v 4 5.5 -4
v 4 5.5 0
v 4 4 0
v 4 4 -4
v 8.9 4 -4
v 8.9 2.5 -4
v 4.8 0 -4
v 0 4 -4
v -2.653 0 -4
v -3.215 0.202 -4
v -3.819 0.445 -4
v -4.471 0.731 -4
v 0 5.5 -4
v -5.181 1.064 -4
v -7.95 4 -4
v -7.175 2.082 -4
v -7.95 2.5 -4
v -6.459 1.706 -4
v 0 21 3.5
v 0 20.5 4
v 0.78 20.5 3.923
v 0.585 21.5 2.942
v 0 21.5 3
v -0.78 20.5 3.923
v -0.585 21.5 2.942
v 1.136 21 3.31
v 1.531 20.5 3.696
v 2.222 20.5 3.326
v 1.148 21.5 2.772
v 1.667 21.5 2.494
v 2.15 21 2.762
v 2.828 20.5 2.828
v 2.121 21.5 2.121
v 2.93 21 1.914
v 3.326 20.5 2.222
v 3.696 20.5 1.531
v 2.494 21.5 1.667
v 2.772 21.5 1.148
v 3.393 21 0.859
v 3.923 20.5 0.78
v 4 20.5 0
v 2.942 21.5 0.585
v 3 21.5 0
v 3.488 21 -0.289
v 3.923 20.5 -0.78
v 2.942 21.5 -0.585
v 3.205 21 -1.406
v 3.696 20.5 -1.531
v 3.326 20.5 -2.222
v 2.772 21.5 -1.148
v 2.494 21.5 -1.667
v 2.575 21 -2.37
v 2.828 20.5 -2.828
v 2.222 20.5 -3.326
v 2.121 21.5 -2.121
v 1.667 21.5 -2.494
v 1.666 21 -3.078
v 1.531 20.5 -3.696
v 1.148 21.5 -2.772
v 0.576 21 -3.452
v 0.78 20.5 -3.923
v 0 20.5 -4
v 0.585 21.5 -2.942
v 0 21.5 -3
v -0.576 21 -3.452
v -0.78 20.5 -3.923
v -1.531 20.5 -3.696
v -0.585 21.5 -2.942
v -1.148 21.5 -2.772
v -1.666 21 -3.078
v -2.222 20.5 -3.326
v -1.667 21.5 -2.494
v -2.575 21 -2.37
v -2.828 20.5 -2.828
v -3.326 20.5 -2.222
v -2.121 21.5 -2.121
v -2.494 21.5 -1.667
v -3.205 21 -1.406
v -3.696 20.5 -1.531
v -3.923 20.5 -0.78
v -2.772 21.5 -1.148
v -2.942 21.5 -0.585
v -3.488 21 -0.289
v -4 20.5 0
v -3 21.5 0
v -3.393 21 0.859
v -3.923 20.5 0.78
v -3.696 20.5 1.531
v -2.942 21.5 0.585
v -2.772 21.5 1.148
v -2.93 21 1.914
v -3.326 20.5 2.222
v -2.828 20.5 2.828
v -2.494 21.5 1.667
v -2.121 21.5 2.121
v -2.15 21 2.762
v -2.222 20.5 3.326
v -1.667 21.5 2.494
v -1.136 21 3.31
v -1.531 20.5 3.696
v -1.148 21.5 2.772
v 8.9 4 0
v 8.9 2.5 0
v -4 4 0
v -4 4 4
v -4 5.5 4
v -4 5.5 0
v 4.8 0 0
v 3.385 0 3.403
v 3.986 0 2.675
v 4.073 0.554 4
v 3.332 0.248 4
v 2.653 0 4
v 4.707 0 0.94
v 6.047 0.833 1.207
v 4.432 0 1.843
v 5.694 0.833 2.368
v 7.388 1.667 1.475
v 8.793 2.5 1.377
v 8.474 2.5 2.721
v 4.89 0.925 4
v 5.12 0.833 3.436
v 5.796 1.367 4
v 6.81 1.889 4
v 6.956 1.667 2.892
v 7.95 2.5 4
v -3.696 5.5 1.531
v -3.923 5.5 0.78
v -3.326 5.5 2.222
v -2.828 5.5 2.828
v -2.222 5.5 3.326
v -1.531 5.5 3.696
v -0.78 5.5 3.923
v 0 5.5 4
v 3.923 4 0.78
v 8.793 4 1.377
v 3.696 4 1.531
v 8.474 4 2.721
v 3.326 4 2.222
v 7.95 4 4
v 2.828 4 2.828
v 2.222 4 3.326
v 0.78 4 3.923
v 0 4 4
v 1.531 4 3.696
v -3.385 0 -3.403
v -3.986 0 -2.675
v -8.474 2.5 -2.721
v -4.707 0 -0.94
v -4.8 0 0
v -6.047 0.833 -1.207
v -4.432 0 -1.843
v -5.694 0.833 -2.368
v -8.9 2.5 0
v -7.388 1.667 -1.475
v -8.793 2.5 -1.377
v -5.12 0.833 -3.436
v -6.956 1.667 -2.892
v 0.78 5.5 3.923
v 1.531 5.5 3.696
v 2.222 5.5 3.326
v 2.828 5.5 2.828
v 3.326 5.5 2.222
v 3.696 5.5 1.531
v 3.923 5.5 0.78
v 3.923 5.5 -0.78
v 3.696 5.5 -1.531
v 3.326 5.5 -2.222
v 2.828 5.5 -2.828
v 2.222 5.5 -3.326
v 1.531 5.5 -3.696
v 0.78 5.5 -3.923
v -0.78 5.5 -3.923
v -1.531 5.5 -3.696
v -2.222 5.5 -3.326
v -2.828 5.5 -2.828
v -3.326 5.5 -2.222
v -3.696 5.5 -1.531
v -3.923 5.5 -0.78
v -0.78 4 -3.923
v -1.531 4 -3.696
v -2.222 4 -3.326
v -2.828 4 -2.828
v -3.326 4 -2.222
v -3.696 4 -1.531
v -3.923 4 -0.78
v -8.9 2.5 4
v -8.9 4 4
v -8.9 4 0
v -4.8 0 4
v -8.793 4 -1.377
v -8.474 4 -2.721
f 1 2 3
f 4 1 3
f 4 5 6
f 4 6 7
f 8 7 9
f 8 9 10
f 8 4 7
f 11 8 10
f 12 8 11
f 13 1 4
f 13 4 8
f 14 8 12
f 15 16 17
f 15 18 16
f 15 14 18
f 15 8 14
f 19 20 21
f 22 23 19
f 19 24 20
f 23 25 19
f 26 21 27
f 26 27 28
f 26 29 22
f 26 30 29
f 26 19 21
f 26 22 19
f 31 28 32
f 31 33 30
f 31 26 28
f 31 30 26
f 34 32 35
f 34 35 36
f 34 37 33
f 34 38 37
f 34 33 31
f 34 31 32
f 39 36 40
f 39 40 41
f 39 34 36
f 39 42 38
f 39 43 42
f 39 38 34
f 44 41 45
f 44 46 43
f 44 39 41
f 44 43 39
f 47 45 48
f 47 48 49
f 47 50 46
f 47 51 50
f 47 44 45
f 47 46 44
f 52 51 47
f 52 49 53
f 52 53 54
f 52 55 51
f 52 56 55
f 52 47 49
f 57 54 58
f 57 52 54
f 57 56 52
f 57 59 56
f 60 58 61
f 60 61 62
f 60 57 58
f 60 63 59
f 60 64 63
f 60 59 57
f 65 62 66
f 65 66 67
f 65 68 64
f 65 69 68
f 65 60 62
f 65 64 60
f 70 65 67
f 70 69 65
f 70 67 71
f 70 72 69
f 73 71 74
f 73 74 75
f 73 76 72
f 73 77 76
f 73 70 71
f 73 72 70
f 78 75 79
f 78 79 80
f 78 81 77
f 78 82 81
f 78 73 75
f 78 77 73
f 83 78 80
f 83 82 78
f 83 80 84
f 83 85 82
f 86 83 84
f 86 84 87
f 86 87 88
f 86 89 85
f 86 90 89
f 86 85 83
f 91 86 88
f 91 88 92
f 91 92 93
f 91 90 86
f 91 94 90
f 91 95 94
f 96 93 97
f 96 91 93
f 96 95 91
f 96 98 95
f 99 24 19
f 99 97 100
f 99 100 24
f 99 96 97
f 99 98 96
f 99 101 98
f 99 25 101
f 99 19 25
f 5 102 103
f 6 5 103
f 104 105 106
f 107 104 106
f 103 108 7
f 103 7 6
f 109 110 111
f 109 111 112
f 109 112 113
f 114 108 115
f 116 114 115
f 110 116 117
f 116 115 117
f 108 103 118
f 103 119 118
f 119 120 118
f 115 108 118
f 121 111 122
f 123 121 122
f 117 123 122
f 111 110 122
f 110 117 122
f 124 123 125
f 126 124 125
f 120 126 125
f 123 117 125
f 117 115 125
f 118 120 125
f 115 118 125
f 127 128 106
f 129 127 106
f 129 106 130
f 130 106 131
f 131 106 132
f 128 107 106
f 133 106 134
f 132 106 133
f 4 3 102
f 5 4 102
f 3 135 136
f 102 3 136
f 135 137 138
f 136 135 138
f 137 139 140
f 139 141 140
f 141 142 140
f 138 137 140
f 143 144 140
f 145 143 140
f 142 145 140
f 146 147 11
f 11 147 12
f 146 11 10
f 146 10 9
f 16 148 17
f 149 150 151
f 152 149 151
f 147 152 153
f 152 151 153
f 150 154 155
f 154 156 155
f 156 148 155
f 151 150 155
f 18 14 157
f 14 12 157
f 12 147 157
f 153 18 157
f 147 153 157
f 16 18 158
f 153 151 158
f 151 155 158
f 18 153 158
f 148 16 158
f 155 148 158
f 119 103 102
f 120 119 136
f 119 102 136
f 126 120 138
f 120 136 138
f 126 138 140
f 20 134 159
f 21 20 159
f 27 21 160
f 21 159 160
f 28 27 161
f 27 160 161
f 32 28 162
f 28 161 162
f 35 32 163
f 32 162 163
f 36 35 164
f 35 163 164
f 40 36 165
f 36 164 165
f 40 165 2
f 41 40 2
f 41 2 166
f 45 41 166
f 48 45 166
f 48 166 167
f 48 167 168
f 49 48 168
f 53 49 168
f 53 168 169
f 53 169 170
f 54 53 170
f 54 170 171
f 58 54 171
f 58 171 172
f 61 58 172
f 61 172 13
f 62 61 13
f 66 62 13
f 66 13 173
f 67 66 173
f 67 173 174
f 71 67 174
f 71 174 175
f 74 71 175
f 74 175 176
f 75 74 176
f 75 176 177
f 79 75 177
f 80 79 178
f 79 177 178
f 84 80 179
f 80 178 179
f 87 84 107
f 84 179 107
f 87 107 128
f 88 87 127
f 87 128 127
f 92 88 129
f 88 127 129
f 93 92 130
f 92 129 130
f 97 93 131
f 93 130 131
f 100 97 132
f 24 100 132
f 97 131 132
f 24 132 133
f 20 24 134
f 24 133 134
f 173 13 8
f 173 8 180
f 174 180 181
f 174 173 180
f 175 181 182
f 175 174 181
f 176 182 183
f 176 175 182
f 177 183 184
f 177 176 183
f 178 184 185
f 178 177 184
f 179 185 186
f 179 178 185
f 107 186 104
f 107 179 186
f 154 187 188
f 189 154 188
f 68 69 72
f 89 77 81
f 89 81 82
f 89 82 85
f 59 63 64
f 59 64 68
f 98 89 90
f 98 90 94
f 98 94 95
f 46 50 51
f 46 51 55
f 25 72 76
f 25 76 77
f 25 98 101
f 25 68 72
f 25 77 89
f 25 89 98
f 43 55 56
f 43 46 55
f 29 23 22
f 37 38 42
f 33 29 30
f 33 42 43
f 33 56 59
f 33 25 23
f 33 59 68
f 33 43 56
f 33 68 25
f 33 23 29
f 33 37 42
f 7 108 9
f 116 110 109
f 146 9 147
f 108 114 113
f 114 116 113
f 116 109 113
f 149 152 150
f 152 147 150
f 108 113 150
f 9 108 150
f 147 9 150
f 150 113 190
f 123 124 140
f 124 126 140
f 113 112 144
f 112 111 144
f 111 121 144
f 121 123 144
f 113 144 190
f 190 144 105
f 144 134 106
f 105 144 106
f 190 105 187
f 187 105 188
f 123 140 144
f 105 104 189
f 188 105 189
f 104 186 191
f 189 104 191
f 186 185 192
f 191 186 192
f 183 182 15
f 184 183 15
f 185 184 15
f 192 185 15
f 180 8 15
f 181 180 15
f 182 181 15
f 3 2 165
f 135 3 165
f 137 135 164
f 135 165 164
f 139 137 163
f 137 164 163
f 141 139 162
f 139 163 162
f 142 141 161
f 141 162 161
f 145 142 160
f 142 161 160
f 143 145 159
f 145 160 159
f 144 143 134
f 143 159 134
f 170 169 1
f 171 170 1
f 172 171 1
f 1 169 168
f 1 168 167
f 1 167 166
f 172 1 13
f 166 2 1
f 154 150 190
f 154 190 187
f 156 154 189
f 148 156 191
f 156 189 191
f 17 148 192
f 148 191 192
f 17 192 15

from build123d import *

# Parameters (mm, degrees)
EXTRUDE_1_DEPTH     = 4
CUT_EXTRUDE_1_DEPTH = 1.5
SKETCH_2_R          = 4
EXTRUDE_2_DEPTH     = 16
CUT_EXTRUDE_2_DEPTH = 5
CHAMFER_2_SIZE      = 1


with BuildPart() as part:
    # Эскиз1 → Бобышка-Вытянуть1 (new body, symmetric)
    with BuildSketch(Plane.XY):
        Polygon((8.9, 0), (-8.9, 0), (-8.9, 4), (-4, 4), (-4, 5.5), (4, 5.5), (4, 4), (8.9, 4), align=None)
    extrude(amount=EXTRUDE_1_DEPTH, both=True)

    # Эскиз3 → Вырез-Вытянуть1 (cut)
    with BuildSketch(Plane(origin=(0, 5.5, 0), x_dir=(1, 0, 0), z_dir=(0, 1, 0))):
        with BuildLine():
            Line((-4, 0), (-4, 4))
            Line((-4, 4), (0, 4))
            ThreePointArc((0, 4), (-2.828427125, 2.828427125), (-4, 0))
        make_face()
        with BuildLine():
            Line((0, -4), (4, -4))
            Line((4, -4), (4, 0))
            ThreePointArc((4, 0), (2.828427125, -2.828427125), (0, -4))
        make_face()
    extrude(amount=-CUT_EXTRUDE_1_DEPTH, mode=Mode.SUBTRACT)

    # Эскиз2 → Бобышка-Вытянуть2 (add)
    with BuildSketch(Plane(origin=(0, 5.5, 0), x_dir=(1, 0, 0), z_dir=(0, 1, 0))):
        with Locations(Location((0, 0, 0), (0, 0, 270))):  # turned: the seam where the file's is
            Circle(SKETCH_2_R)
    extrude(amount=EXTRUDE_2_DEPTH)

    # Эскиз4 → Вырез-Вытянуть2 (cut, through all)
    with BuildSketch(Plane(origin=(0, 4, 0), x_dir=(1, 0, 0), z_dir=(0, 1, 0))):
        with BuildLine():
            Line((-7.950471684, 4), (-8.9, 4))
            Line((-8.9, 4), (-8.9, 0))
            ThreePointArc((-8.9, 0), (-8.659364815, 2.055578022), (-7.950471684, 4))
        make_face()
        with BuildLine():
            Line((7.950471684, -4), (8.9, -4))
            Line((8.9, -4), (8.9, 0))
            ThreePointArc((8.9, 0), (8.659364815, -2.055578022), (7.950471684, -4))
        make_face()
    extrude(amount=-CUT_EXTRUDE_2_DEPTH, mode=Mode.SUBTRACT)

    # Вырез-По траектории1: sweep along a path in Эскиз6
    with BuildLine(Plane.XZ) as sweep_1_path:
        Line((0, -8.9), (8.9, -8.9))
        Line((8.9, -8.9), (8.9, 0))
        ThreePointArc((8.9, 0), (6.293250353, 6.293250353), (0, 8.9))
        Line((0, 8.9), (-8.9, 8.9))
        Line((-8.9, 8.9), (-8.9, 0))
        ThreePointArc((-8.9, 0), (-6.293250353, -6.293250353), (0, -8.9))
    # Эскиз5 → Вырез-По траектории1 (sweep, cut)
    with BuildSketch(Plane.XY.offset(4)):
        Polygon((-8.9, 2.5), (-4.8, 0), (-8.9, 0), align=None)
    sweep(path=sweep_1_path.line, transition=Transition.RIGHT, mode=Mode.SUBTRACT)

    # Фаска2
    chamfer_2_edges = [part.edges().sort_by_distance(p)[0] for p in [
        (0, 21.5, -4),
    ]]
    chamfer(chamfer_2_edges, length=CHAMFER_2_SIZE)


solid = part.part
